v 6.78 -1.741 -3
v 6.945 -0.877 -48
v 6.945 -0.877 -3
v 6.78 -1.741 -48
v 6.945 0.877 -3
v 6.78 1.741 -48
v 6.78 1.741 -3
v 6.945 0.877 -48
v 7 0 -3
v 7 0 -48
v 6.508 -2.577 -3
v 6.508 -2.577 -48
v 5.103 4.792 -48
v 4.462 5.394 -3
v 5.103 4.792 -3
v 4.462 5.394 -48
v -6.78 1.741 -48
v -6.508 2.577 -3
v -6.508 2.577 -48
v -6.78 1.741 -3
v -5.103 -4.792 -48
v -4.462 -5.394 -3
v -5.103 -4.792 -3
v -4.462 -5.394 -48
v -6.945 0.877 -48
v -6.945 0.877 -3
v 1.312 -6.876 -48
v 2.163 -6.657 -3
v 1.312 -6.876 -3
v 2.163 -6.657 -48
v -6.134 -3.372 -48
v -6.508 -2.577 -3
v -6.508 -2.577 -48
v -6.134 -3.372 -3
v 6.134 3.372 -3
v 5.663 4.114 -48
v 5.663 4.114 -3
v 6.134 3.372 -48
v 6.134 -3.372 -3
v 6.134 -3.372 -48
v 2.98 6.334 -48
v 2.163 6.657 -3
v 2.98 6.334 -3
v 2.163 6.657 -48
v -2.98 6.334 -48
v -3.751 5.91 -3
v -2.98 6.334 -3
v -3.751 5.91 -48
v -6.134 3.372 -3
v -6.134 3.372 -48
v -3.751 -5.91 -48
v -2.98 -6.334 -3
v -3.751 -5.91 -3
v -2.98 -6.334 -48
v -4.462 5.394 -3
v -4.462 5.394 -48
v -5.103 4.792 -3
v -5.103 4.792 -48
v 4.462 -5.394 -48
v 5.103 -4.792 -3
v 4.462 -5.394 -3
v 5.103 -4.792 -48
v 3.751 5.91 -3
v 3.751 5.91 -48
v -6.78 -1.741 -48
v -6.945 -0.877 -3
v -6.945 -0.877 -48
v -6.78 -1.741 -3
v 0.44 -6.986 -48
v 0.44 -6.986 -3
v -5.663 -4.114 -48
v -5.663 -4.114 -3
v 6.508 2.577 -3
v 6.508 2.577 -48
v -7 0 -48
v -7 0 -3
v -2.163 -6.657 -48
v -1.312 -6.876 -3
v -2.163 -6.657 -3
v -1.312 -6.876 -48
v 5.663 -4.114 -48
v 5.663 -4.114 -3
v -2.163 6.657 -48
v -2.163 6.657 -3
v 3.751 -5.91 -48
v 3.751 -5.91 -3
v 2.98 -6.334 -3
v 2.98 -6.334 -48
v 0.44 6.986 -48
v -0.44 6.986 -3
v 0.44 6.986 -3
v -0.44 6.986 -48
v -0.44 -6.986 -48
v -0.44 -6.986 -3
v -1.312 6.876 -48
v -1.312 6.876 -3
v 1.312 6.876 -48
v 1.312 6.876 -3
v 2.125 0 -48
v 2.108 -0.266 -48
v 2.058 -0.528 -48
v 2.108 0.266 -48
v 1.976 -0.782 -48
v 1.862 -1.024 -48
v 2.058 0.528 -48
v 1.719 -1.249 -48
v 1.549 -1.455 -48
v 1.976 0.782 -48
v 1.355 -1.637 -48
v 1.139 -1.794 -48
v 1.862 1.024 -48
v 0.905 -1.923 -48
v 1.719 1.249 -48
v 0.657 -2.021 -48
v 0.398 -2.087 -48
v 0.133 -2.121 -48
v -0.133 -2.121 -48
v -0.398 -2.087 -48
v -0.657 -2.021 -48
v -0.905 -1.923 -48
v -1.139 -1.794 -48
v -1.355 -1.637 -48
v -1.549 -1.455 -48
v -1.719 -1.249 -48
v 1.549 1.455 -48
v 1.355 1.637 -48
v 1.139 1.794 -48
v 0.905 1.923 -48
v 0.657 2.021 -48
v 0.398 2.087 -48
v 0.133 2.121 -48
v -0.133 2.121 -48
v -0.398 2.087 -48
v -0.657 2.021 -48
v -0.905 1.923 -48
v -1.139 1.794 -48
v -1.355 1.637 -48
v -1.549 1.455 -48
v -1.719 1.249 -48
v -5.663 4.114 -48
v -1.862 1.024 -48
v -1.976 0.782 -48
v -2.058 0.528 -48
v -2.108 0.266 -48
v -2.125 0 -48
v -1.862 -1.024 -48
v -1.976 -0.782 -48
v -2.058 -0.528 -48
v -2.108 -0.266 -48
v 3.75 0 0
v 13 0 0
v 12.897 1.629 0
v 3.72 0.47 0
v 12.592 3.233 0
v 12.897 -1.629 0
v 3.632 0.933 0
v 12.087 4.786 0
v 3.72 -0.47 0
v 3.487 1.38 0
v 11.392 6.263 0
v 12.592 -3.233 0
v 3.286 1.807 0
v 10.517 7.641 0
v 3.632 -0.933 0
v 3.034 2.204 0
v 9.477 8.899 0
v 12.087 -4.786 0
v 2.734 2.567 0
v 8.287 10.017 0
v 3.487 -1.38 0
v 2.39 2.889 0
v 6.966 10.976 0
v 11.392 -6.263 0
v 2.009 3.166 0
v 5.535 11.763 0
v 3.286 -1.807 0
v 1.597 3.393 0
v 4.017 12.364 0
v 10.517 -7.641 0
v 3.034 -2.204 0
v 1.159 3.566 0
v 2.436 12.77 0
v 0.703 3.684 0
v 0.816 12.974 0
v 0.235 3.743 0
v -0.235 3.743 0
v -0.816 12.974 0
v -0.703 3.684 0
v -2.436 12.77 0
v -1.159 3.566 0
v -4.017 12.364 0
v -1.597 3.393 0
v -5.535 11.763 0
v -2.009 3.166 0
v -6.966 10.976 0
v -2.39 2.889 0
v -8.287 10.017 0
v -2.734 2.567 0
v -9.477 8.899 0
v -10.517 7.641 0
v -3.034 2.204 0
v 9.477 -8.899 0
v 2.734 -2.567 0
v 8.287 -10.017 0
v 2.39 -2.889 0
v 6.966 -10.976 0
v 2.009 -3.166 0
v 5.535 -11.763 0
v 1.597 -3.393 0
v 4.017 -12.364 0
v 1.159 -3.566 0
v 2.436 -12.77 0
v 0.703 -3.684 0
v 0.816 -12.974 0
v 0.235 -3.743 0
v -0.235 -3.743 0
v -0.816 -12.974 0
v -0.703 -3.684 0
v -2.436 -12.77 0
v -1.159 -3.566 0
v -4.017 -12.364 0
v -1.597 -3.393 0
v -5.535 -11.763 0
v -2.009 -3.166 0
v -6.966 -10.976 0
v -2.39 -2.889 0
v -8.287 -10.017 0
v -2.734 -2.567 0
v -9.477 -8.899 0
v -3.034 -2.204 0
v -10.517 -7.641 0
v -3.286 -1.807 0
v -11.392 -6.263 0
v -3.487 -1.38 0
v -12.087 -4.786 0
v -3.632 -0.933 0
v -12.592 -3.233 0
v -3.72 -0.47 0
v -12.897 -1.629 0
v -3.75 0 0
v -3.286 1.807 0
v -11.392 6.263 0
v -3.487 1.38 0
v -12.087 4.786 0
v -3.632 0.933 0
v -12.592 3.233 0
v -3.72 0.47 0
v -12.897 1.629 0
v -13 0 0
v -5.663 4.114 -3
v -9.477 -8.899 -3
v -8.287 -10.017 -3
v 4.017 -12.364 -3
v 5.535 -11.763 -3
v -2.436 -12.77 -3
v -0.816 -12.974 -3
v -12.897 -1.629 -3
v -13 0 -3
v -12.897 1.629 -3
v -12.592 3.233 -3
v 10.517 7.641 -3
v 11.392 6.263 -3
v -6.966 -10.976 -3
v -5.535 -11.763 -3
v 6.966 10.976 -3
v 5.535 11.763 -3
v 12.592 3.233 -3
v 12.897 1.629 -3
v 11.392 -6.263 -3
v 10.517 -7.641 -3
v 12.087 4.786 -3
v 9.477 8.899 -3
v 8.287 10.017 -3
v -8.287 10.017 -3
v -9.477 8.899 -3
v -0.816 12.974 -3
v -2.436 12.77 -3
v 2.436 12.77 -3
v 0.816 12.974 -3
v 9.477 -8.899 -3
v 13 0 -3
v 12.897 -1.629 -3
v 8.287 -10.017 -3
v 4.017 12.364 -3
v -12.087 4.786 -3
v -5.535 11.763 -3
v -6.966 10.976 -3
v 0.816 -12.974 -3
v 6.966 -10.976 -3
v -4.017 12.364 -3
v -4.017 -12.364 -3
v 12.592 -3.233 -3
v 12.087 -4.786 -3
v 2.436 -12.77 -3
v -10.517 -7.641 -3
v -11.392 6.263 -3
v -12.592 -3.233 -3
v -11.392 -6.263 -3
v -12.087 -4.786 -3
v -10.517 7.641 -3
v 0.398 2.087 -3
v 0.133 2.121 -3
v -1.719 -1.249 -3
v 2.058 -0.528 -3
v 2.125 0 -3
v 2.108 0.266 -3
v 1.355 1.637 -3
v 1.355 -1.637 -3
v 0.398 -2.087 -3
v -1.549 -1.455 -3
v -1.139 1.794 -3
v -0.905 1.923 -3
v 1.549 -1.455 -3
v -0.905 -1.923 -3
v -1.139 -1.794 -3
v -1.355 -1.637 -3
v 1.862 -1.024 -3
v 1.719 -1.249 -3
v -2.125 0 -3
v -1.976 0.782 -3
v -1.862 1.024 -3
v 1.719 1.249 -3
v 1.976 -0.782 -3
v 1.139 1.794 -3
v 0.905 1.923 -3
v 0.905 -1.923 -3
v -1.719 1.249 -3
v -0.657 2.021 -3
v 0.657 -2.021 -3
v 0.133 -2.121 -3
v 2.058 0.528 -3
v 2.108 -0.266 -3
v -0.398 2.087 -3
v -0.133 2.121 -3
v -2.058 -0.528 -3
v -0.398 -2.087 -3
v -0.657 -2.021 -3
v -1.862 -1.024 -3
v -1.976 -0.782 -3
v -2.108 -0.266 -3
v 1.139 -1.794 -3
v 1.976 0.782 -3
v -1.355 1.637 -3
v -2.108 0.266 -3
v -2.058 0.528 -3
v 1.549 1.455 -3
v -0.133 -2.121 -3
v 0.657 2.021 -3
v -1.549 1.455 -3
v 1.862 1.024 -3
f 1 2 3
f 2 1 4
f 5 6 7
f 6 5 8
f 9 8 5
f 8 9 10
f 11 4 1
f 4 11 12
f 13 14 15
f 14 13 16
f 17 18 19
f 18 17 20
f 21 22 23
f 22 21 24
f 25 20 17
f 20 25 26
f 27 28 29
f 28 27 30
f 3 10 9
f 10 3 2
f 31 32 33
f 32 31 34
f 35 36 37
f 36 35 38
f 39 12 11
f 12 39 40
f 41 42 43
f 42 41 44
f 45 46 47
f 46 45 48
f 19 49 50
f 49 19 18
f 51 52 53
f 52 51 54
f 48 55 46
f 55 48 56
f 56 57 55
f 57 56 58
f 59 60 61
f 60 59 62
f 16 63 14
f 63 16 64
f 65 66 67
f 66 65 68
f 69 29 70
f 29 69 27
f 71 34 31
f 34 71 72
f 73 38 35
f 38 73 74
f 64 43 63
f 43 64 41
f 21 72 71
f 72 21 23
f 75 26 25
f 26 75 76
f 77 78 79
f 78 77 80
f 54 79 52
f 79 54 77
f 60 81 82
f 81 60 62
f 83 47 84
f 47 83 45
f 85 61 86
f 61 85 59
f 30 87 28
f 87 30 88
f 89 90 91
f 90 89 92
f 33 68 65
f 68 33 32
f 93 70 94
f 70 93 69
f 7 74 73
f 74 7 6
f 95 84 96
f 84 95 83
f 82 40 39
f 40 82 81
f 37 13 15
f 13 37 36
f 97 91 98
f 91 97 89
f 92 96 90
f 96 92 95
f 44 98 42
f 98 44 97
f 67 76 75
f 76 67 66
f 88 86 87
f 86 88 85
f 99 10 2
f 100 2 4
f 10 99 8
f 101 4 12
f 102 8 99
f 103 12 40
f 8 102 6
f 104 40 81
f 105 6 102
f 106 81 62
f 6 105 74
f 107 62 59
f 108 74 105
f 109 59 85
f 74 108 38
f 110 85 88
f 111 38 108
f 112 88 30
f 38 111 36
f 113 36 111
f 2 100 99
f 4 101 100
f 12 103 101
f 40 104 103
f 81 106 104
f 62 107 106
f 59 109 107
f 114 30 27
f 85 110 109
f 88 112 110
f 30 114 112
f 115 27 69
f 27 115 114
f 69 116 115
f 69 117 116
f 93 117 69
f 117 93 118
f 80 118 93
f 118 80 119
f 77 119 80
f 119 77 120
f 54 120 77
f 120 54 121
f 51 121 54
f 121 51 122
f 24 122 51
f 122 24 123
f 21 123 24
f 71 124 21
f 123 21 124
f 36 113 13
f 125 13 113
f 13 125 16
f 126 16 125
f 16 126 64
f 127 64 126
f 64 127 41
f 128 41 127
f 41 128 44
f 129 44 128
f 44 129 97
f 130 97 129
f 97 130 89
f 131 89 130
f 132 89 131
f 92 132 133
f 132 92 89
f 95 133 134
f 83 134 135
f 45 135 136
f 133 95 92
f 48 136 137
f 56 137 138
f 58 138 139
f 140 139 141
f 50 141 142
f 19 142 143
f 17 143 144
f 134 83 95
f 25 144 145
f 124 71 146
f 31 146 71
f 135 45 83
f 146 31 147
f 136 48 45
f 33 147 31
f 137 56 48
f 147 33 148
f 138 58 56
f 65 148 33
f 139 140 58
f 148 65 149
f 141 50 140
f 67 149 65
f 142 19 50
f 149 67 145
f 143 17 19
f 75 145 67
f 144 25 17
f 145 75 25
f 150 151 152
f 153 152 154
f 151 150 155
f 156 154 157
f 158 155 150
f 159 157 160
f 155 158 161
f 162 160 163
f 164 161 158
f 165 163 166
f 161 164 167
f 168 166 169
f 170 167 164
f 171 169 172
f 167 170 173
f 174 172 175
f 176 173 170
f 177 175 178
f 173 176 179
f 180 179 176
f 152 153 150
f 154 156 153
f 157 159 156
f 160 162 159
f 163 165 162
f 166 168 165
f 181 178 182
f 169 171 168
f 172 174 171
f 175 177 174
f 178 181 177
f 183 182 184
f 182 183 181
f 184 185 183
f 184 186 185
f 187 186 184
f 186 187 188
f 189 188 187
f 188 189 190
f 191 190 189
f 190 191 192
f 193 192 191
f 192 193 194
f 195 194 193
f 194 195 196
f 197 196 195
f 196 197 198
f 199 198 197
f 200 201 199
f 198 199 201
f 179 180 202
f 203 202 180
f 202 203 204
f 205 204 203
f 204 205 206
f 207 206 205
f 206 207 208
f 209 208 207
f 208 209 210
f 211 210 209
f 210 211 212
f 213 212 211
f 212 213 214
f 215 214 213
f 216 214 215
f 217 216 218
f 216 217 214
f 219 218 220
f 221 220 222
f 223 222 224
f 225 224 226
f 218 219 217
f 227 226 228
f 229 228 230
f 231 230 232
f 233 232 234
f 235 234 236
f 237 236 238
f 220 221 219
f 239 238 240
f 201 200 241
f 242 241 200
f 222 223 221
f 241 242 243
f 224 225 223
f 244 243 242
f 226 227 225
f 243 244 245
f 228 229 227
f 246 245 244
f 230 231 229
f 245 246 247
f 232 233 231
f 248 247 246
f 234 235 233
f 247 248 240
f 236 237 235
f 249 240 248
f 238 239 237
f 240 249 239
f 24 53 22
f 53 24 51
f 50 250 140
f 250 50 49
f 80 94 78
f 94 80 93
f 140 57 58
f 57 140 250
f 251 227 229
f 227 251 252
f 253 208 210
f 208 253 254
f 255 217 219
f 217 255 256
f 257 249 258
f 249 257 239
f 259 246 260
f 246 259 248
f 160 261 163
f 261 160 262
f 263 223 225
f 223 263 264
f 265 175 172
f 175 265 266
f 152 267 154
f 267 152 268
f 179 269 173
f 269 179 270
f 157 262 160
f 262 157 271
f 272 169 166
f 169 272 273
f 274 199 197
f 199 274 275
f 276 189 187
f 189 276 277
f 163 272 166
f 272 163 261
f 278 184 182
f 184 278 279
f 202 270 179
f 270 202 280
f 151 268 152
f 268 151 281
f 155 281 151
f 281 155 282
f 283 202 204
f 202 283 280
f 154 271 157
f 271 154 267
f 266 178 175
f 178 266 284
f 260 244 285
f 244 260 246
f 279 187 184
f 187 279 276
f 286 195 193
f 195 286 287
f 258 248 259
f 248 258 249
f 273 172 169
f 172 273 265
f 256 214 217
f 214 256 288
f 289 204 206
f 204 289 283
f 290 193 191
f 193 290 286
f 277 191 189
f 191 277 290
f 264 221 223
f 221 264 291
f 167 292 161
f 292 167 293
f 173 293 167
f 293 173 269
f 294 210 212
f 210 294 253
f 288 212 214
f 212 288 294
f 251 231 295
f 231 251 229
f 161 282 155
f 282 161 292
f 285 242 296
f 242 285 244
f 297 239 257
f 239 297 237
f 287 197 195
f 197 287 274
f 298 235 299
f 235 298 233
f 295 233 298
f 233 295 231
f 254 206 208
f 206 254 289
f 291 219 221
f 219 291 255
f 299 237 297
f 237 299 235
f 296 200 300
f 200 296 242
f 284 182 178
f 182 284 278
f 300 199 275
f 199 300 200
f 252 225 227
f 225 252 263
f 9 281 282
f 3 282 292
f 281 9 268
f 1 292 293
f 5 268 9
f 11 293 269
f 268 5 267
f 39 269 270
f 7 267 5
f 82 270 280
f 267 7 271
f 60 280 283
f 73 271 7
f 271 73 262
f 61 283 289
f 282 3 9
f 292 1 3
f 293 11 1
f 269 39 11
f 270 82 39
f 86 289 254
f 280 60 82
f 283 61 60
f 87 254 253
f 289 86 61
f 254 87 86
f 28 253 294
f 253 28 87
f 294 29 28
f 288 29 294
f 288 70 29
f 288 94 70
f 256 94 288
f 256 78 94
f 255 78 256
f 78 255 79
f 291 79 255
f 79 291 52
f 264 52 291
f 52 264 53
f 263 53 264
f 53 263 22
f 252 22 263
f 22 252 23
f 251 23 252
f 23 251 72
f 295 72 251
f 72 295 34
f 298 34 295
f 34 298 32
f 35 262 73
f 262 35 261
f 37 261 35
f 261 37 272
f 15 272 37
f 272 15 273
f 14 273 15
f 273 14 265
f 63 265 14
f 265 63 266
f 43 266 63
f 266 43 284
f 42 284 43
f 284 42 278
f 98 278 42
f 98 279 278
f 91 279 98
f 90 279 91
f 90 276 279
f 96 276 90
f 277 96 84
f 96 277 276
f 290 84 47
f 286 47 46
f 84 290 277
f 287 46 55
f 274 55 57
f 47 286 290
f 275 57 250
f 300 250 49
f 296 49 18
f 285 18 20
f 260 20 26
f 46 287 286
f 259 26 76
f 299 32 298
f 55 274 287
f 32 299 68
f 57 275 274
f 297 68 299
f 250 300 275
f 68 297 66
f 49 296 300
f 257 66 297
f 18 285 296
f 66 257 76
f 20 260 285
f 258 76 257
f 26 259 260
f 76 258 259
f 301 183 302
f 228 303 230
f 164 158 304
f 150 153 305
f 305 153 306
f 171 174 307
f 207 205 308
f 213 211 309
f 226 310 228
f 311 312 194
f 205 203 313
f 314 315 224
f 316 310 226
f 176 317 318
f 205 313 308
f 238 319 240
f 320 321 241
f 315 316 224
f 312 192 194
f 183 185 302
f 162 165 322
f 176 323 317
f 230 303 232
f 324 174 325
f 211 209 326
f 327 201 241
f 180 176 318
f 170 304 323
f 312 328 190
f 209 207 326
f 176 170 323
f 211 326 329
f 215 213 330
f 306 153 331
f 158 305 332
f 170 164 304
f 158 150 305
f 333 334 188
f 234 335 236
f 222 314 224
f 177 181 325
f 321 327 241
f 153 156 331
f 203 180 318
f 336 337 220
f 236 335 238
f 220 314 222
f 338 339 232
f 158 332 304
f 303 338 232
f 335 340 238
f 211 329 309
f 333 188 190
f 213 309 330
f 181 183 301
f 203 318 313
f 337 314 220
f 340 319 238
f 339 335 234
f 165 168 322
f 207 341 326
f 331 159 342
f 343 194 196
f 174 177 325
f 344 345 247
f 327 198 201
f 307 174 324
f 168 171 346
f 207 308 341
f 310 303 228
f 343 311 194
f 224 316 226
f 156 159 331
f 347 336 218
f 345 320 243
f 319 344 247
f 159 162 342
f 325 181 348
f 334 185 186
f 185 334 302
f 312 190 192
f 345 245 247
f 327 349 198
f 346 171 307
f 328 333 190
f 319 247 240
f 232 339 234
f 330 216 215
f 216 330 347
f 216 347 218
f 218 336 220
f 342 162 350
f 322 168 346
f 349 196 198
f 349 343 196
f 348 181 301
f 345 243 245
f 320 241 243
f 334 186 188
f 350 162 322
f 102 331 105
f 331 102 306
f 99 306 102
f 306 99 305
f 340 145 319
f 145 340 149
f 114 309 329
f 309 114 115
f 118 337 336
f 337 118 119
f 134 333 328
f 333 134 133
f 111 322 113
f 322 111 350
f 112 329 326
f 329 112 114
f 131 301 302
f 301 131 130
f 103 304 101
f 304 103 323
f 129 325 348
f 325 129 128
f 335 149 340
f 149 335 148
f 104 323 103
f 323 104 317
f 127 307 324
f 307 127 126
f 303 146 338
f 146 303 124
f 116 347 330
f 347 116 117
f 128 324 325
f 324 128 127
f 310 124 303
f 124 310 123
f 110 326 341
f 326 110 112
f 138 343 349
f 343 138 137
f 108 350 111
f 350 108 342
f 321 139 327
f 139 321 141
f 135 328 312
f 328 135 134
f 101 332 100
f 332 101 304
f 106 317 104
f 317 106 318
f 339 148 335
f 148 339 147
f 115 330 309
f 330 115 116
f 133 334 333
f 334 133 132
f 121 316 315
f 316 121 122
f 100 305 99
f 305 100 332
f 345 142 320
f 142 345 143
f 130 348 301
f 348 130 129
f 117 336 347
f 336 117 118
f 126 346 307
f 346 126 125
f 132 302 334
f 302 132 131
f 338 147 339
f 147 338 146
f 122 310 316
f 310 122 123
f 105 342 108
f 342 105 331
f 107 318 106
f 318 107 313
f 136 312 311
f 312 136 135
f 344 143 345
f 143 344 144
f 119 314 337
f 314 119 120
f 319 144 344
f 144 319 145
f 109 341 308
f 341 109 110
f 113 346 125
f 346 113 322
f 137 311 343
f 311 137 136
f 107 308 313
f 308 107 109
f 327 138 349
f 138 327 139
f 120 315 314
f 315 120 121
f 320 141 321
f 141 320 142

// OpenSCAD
$fn = 50;


difference() {
	union() {
		translate(v = [0, 0, -48.0000000000]) {
			cylinder(h = 48, r = 7.0000000000);
		}
		translate(v = [0, 0, -3.0000000000]) {
			cylinder(h = 3, r = 13.0000000000);
		}
	}
	union() {
		translate(v = [0, 0, 0]) {
			rotate(a = [0, 0, 0]) {
				difference() {
					union() {
						#translate(v = [0, 0, -48.0000000000]) {
							cylinder(h = 48, r = 2.0000000000);
						}
						#translate(v = [0, 0, -3]) {
							cylinder(h = 3, r = 7.0000000000, r1 = 2.1250000000, r2 = 3.7500000000);
						}
						#translate(v = [0, 0, -48.0000000000]) {
							cylinder(h = 48, r = 2.1250000000);
						}
						#translate(v = [0, 0, -48.0000000000]) {
							cylinder(h = 48, r = 2.0000000000);
						}
					}
					union();
				}
			}
		}
	}
}
